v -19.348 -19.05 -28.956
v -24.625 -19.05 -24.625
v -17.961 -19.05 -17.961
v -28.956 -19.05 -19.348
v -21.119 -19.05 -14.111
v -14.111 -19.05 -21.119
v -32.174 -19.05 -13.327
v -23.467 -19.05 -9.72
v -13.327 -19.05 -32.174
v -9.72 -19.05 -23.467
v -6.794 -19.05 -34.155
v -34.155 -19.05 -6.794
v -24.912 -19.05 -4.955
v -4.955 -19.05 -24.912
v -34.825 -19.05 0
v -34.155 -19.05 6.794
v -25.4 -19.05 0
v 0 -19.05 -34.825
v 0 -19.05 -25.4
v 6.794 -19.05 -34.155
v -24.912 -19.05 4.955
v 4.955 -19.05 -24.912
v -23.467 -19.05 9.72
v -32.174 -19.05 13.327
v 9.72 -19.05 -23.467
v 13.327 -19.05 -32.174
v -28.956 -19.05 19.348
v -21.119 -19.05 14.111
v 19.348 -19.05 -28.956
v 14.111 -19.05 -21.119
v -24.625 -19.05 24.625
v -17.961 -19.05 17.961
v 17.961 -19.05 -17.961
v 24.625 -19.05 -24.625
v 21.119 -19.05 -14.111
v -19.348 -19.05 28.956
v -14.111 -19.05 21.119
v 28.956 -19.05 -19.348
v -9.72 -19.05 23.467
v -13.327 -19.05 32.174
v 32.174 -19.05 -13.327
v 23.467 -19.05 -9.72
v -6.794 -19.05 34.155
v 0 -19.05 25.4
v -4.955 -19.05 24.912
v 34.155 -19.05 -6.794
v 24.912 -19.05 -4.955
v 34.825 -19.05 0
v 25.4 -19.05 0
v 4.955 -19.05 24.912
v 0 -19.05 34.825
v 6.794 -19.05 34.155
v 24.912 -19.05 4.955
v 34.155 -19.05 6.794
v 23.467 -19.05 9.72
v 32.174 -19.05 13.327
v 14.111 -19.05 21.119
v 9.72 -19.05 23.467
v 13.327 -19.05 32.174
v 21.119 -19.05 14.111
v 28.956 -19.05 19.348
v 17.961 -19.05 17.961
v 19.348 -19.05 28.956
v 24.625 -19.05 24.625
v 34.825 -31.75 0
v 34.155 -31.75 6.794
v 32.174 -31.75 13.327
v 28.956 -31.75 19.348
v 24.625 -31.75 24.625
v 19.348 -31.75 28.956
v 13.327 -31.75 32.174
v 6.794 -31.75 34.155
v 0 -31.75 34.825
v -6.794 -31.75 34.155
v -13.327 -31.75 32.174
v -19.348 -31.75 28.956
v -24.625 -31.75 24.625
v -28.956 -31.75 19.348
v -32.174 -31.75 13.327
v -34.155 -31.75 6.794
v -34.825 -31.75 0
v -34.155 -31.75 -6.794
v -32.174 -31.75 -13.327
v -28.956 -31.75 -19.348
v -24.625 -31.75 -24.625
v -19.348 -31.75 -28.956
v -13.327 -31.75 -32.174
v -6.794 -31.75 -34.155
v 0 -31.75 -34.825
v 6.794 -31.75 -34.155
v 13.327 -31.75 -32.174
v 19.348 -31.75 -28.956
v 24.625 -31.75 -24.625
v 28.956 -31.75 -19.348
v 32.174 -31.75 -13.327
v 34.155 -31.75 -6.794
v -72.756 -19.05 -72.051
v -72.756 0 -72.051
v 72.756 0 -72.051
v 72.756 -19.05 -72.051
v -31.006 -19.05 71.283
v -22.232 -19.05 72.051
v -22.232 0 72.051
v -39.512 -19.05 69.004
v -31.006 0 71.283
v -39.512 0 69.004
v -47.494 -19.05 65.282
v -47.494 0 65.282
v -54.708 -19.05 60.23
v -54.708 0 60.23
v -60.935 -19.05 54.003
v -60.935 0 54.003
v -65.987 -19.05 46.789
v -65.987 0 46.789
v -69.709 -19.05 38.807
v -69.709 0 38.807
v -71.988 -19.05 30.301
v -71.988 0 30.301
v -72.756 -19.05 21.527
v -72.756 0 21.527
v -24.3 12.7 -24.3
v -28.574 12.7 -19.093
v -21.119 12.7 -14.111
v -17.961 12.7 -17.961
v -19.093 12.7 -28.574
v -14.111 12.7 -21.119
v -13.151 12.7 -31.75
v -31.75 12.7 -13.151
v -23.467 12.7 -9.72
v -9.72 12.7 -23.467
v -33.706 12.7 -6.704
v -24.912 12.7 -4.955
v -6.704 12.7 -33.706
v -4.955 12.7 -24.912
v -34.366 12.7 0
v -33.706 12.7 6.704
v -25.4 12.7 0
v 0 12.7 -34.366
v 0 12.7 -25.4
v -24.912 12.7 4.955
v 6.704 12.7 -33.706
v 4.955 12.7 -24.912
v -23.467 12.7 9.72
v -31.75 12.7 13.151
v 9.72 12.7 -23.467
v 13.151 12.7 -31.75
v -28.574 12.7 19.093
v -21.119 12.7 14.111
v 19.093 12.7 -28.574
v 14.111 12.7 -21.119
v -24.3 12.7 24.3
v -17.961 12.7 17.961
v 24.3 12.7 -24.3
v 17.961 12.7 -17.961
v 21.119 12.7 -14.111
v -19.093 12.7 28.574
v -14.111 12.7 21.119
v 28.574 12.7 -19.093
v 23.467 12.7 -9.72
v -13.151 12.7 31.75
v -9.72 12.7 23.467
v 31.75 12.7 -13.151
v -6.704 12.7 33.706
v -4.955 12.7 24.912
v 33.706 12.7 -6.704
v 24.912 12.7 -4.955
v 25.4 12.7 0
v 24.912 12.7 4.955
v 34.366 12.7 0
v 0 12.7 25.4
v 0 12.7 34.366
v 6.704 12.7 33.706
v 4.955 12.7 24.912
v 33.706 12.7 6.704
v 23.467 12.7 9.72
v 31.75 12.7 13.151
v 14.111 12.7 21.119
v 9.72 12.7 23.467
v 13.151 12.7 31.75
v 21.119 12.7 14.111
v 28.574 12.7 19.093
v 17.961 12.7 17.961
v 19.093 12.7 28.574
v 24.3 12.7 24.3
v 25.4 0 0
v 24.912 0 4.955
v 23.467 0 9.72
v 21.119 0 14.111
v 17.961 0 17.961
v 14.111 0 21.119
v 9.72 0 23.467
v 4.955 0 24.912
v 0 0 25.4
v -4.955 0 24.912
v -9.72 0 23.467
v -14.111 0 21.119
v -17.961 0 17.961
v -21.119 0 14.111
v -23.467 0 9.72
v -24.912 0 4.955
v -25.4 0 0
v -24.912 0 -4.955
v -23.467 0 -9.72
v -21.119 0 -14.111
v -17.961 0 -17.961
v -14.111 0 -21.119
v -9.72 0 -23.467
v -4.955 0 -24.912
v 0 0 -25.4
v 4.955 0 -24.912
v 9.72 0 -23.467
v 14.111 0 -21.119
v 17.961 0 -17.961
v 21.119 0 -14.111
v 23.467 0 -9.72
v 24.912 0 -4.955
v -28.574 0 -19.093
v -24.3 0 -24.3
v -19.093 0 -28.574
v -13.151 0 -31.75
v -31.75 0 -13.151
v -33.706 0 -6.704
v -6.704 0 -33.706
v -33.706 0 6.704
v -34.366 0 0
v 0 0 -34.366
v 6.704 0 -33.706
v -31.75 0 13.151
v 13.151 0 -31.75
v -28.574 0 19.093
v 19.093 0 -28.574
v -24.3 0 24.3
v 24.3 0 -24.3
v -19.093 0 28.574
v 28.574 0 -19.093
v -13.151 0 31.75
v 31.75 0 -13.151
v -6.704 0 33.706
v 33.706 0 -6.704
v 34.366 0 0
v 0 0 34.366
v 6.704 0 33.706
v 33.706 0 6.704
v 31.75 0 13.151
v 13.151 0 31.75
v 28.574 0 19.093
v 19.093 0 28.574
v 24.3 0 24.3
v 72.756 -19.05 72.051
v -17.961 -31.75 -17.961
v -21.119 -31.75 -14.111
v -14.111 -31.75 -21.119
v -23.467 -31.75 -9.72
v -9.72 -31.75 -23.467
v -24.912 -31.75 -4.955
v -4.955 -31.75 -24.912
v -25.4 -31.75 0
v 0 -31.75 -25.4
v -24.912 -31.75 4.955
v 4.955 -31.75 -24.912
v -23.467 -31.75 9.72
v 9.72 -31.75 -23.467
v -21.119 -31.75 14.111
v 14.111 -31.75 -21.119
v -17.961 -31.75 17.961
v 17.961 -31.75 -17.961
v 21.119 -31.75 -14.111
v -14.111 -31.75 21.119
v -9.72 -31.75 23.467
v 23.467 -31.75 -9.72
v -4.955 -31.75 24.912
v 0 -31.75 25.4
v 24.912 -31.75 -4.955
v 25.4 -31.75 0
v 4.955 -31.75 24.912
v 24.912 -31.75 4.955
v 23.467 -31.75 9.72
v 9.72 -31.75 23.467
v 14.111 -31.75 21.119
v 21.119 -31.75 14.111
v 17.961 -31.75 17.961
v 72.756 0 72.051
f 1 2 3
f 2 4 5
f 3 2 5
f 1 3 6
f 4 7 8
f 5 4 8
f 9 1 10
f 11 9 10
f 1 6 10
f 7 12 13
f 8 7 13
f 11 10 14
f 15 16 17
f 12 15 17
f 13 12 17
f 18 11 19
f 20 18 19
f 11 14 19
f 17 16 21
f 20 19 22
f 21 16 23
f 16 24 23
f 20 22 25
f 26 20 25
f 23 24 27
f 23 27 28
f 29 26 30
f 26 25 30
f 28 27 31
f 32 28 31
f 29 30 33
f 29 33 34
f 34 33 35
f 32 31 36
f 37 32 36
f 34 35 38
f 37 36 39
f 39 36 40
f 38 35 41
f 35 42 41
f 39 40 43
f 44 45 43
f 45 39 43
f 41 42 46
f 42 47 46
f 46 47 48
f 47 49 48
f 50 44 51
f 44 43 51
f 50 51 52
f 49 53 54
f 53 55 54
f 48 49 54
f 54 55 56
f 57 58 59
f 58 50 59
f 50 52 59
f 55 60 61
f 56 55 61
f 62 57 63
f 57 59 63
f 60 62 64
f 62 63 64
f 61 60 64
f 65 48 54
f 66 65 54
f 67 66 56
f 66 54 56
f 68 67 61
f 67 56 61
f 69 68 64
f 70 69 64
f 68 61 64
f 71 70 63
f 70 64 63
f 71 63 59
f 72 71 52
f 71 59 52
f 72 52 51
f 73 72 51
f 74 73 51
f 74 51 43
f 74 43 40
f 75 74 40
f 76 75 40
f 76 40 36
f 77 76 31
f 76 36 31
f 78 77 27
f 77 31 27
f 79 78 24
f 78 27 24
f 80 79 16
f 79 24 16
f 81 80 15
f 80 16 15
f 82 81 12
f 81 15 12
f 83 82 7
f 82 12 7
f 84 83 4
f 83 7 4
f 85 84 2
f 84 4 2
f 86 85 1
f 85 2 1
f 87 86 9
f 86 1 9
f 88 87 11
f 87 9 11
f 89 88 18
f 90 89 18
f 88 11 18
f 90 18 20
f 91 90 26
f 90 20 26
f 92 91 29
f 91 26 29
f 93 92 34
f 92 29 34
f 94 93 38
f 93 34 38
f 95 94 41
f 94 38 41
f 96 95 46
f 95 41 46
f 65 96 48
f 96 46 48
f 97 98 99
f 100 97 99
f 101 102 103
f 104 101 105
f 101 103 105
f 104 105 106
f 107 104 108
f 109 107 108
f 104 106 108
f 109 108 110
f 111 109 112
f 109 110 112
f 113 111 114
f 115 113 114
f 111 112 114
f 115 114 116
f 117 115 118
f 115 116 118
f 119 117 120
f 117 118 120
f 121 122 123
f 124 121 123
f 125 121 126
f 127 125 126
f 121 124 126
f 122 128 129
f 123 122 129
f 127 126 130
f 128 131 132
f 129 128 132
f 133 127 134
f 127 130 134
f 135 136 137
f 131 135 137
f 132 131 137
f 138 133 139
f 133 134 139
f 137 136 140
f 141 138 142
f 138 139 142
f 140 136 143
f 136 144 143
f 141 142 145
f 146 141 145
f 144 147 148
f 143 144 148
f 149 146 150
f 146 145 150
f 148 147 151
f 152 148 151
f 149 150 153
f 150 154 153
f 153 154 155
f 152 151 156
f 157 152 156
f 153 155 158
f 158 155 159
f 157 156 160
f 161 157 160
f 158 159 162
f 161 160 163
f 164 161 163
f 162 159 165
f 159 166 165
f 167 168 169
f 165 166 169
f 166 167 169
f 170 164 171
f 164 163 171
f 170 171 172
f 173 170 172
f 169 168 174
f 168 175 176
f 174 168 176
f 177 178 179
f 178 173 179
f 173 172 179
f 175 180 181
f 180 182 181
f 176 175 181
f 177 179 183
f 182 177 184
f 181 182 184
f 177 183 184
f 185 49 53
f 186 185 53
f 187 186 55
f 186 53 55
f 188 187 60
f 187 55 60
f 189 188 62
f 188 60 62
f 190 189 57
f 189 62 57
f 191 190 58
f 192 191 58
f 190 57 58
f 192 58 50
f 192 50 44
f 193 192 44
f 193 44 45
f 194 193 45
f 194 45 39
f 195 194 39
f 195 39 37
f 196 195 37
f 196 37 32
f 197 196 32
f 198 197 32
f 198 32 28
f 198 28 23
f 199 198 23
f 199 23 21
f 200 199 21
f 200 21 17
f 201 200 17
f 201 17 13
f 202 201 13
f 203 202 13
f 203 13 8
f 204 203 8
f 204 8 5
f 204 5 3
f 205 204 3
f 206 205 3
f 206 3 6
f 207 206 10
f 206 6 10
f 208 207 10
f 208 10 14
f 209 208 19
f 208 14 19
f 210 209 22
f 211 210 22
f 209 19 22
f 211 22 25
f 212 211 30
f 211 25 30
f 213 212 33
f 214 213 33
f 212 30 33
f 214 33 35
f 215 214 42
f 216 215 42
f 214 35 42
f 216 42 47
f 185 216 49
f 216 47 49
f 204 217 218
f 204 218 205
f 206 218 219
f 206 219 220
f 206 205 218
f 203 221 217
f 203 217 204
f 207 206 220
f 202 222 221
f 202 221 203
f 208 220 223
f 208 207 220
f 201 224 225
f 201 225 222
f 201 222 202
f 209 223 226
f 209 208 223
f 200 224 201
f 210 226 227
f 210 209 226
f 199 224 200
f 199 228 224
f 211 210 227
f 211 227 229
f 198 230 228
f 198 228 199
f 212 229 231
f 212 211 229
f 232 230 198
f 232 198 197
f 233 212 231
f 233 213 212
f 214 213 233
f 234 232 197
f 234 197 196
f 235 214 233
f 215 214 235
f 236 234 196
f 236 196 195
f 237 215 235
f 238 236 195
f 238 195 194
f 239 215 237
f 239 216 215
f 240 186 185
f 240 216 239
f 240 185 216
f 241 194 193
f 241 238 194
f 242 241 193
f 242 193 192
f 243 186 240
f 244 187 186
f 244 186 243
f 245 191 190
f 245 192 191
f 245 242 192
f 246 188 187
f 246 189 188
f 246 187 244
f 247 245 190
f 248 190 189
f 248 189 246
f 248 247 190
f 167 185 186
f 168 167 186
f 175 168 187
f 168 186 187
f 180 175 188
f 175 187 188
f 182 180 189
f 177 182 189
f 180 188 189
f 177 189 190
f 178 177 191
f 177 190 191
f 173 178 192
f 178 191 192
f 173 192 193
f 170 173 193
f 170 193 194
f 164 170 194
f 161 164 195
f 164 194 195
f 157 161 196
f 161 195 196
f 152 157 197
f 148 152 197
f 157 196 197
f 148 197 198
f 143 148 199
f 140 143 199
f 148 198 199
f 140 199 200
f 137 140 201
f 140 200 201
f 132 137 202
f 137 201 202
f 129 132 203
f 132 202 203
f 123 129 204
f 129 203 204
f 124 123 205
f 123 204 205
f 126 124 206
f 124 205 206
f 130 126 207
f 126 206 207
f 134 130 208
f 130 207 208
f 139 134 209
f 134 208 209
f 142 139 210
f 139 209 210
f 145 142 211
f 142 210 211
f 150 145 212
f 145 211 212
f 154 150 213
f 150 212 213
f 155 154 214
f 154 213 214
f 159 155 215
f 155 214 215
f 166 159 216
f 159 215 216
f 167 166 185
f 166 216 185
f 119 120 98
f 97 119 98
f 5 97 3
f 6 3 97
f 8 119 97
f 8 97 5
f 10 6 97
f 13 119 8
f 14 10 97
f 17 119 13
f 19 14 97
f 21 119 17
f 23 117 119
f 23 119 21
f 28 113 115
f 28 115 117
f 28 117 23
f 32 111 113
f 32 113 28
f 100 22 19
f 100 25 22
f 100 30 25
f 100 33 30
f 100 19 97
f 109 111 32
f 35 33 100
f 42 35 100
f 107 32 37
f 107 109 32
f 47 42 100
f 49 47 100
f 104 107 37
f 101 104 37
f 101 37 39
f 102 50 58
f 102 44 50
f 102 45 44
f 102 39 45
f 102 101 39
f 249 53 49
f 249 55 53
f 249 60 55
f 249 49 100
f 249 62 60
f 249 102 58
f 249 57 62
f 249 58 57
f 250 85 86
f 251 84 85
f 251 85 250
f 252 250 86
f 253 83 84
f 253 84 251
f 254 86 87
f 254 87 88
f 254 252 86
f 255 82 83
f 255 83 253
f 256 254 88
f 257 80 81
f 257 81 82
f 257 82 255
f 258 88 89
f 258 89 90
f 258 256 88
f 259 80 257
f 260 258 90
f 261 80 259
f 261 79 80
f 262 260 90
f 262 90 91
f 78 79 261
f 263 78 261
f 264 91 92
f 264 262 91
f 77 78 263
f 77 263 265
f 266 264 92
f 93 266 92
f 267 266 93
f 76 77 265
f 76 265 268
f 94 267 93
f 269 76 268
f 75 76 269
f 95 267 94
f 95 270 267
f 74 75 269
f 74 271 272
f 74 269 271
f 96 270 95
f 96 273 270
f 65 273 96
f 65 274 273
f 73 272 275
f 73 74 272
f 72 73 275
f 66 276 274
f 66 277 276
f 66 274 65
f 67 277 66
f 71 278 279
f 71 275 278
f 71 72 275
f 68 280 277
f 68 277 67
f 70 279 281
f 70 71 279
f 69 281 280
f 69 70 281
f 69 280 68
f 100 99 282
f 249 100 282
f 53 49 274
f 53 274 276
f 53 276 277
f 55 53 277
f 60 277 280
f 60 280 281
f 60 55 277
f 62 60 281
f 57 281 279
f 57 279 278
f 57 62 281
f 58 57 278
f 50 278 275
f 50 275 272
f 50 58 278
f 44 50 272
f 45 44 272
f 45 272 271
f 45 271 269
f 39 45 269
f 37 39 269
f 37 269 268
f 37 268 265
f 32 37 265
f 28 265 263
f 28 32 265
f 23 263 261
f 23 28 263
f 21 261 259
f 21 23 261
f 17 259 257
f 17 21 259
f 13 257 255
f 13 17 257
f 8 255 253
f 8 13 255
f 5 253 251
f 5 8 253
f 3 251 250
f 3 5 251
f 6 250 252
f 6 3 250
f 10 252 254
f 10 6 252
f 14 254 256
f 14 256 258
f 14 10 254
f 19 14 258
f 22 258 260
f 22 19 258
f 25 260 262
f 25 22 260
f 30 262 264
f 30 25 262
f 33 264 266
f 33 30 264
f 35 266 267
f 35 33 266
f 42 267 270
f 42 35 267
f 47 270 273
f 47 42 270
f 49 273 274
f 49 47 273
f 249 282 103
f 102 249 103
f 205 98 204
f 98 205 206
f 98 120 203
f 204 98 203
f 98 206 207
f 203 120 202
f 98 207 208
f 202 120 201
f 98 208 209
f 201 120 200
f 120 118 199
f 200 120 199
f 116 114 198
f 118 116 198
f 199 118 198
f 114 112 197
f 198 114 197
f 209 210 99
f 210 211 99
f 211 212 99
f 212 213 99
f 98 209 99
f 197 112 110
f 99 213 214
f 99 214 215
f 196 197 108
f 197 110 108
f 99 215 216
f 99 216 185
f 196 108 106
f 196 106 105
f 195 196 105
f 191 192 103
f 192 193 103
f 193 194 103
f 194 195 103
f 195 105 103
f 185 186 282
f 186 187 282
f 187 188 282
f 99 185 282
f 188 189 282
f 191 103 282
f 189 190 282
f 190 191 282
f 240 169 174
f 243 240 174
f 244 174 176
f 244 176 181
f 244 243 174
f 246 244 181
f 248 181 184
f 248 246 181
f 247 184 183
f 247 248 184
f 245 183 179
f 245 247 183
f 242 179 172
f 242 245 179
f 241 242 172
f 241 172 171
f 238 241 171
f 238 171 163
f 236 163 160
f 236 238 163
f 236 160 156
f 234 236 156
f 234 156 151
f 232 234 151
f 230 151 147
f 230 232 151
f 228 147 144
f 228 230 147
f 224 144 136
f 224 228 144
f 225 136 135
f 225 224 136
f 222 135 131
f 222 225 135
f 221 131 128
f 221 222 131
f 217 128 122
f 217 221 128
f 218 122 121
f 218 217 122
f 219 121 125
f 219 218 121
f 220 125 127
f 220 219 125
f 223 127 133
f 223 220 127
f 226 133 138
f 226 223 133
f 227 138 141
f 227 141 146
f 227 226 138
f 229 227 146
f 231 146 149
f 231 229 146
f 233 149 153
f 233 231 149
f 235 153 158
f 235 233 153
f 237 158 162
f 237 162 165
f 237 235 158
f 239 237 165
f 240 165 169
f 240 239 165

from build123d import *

# Parameters (mm, degrees)
F1_DEPTH = 19.05
F2_R     = 25.4
F3_DEPTH = 19.051
F4_R     = 34.8245853093
F4_R_2   = 25.4
F5_DEPTH = 12.7
F6_R     = 34.3660006983
F6_R_2   = 25.4
F7_DEPTH = 12.7


with BuildPart() as f1:
    # F0 (on Front) → F1 (new body)
    with BuildSketch(Plane.XZ):
        with BuildLine():
            Line((72.7557316422, 72.0507353544), (-22.2322288666, 72.0507353544))
            ThreePointArc((-22.2322288666, 72.0507353544), (-57.9577402886, 57.2527440007), (-72.7557316422, 21.5272325788))
            Line((-72.7557316422, 21.5272325788), (-72.7557316422, -72.0507353544))
            Line((-72.7557316422, -72.0507353544), (72.7557316422, -72.0507353544))
            Line((72.7557316422, -72.0507353544), (72.7557316422, 72.0507353544))
        make_face()
    extrude(amount=F1_DEPTH)

    # F2 (on face) → F3 (cut, through all)
    with BuildSketch(Plane.XZ.offset(19.05)):
        Circle(F2_R)
    extrude(amount=-F3_DEPTH, mode=Mode.SUBTRACT)


with BuildPart() as f5:
    # F4 (on face) → F5 (new body)
    with BuildSketch(Plane.XZ.offset(19.05)):
        Circle(F4_R)
        Circle(F4_R_2, mode=Mode.SUBTRACT)
    extrude(amount=F5_DEPTH)


with BuildPart() as f7:
    # F6 (on Front) → F7 (new body)
    with BuildSketch(Plane.XZ):
        Circle(F6_R)
        Circle(F6_R_2, mode=Mode.SUBTRACT)
    extrude(amount=-F7_DEPTH)


solid = Compound([f1.part, f5.part, f7.part])
